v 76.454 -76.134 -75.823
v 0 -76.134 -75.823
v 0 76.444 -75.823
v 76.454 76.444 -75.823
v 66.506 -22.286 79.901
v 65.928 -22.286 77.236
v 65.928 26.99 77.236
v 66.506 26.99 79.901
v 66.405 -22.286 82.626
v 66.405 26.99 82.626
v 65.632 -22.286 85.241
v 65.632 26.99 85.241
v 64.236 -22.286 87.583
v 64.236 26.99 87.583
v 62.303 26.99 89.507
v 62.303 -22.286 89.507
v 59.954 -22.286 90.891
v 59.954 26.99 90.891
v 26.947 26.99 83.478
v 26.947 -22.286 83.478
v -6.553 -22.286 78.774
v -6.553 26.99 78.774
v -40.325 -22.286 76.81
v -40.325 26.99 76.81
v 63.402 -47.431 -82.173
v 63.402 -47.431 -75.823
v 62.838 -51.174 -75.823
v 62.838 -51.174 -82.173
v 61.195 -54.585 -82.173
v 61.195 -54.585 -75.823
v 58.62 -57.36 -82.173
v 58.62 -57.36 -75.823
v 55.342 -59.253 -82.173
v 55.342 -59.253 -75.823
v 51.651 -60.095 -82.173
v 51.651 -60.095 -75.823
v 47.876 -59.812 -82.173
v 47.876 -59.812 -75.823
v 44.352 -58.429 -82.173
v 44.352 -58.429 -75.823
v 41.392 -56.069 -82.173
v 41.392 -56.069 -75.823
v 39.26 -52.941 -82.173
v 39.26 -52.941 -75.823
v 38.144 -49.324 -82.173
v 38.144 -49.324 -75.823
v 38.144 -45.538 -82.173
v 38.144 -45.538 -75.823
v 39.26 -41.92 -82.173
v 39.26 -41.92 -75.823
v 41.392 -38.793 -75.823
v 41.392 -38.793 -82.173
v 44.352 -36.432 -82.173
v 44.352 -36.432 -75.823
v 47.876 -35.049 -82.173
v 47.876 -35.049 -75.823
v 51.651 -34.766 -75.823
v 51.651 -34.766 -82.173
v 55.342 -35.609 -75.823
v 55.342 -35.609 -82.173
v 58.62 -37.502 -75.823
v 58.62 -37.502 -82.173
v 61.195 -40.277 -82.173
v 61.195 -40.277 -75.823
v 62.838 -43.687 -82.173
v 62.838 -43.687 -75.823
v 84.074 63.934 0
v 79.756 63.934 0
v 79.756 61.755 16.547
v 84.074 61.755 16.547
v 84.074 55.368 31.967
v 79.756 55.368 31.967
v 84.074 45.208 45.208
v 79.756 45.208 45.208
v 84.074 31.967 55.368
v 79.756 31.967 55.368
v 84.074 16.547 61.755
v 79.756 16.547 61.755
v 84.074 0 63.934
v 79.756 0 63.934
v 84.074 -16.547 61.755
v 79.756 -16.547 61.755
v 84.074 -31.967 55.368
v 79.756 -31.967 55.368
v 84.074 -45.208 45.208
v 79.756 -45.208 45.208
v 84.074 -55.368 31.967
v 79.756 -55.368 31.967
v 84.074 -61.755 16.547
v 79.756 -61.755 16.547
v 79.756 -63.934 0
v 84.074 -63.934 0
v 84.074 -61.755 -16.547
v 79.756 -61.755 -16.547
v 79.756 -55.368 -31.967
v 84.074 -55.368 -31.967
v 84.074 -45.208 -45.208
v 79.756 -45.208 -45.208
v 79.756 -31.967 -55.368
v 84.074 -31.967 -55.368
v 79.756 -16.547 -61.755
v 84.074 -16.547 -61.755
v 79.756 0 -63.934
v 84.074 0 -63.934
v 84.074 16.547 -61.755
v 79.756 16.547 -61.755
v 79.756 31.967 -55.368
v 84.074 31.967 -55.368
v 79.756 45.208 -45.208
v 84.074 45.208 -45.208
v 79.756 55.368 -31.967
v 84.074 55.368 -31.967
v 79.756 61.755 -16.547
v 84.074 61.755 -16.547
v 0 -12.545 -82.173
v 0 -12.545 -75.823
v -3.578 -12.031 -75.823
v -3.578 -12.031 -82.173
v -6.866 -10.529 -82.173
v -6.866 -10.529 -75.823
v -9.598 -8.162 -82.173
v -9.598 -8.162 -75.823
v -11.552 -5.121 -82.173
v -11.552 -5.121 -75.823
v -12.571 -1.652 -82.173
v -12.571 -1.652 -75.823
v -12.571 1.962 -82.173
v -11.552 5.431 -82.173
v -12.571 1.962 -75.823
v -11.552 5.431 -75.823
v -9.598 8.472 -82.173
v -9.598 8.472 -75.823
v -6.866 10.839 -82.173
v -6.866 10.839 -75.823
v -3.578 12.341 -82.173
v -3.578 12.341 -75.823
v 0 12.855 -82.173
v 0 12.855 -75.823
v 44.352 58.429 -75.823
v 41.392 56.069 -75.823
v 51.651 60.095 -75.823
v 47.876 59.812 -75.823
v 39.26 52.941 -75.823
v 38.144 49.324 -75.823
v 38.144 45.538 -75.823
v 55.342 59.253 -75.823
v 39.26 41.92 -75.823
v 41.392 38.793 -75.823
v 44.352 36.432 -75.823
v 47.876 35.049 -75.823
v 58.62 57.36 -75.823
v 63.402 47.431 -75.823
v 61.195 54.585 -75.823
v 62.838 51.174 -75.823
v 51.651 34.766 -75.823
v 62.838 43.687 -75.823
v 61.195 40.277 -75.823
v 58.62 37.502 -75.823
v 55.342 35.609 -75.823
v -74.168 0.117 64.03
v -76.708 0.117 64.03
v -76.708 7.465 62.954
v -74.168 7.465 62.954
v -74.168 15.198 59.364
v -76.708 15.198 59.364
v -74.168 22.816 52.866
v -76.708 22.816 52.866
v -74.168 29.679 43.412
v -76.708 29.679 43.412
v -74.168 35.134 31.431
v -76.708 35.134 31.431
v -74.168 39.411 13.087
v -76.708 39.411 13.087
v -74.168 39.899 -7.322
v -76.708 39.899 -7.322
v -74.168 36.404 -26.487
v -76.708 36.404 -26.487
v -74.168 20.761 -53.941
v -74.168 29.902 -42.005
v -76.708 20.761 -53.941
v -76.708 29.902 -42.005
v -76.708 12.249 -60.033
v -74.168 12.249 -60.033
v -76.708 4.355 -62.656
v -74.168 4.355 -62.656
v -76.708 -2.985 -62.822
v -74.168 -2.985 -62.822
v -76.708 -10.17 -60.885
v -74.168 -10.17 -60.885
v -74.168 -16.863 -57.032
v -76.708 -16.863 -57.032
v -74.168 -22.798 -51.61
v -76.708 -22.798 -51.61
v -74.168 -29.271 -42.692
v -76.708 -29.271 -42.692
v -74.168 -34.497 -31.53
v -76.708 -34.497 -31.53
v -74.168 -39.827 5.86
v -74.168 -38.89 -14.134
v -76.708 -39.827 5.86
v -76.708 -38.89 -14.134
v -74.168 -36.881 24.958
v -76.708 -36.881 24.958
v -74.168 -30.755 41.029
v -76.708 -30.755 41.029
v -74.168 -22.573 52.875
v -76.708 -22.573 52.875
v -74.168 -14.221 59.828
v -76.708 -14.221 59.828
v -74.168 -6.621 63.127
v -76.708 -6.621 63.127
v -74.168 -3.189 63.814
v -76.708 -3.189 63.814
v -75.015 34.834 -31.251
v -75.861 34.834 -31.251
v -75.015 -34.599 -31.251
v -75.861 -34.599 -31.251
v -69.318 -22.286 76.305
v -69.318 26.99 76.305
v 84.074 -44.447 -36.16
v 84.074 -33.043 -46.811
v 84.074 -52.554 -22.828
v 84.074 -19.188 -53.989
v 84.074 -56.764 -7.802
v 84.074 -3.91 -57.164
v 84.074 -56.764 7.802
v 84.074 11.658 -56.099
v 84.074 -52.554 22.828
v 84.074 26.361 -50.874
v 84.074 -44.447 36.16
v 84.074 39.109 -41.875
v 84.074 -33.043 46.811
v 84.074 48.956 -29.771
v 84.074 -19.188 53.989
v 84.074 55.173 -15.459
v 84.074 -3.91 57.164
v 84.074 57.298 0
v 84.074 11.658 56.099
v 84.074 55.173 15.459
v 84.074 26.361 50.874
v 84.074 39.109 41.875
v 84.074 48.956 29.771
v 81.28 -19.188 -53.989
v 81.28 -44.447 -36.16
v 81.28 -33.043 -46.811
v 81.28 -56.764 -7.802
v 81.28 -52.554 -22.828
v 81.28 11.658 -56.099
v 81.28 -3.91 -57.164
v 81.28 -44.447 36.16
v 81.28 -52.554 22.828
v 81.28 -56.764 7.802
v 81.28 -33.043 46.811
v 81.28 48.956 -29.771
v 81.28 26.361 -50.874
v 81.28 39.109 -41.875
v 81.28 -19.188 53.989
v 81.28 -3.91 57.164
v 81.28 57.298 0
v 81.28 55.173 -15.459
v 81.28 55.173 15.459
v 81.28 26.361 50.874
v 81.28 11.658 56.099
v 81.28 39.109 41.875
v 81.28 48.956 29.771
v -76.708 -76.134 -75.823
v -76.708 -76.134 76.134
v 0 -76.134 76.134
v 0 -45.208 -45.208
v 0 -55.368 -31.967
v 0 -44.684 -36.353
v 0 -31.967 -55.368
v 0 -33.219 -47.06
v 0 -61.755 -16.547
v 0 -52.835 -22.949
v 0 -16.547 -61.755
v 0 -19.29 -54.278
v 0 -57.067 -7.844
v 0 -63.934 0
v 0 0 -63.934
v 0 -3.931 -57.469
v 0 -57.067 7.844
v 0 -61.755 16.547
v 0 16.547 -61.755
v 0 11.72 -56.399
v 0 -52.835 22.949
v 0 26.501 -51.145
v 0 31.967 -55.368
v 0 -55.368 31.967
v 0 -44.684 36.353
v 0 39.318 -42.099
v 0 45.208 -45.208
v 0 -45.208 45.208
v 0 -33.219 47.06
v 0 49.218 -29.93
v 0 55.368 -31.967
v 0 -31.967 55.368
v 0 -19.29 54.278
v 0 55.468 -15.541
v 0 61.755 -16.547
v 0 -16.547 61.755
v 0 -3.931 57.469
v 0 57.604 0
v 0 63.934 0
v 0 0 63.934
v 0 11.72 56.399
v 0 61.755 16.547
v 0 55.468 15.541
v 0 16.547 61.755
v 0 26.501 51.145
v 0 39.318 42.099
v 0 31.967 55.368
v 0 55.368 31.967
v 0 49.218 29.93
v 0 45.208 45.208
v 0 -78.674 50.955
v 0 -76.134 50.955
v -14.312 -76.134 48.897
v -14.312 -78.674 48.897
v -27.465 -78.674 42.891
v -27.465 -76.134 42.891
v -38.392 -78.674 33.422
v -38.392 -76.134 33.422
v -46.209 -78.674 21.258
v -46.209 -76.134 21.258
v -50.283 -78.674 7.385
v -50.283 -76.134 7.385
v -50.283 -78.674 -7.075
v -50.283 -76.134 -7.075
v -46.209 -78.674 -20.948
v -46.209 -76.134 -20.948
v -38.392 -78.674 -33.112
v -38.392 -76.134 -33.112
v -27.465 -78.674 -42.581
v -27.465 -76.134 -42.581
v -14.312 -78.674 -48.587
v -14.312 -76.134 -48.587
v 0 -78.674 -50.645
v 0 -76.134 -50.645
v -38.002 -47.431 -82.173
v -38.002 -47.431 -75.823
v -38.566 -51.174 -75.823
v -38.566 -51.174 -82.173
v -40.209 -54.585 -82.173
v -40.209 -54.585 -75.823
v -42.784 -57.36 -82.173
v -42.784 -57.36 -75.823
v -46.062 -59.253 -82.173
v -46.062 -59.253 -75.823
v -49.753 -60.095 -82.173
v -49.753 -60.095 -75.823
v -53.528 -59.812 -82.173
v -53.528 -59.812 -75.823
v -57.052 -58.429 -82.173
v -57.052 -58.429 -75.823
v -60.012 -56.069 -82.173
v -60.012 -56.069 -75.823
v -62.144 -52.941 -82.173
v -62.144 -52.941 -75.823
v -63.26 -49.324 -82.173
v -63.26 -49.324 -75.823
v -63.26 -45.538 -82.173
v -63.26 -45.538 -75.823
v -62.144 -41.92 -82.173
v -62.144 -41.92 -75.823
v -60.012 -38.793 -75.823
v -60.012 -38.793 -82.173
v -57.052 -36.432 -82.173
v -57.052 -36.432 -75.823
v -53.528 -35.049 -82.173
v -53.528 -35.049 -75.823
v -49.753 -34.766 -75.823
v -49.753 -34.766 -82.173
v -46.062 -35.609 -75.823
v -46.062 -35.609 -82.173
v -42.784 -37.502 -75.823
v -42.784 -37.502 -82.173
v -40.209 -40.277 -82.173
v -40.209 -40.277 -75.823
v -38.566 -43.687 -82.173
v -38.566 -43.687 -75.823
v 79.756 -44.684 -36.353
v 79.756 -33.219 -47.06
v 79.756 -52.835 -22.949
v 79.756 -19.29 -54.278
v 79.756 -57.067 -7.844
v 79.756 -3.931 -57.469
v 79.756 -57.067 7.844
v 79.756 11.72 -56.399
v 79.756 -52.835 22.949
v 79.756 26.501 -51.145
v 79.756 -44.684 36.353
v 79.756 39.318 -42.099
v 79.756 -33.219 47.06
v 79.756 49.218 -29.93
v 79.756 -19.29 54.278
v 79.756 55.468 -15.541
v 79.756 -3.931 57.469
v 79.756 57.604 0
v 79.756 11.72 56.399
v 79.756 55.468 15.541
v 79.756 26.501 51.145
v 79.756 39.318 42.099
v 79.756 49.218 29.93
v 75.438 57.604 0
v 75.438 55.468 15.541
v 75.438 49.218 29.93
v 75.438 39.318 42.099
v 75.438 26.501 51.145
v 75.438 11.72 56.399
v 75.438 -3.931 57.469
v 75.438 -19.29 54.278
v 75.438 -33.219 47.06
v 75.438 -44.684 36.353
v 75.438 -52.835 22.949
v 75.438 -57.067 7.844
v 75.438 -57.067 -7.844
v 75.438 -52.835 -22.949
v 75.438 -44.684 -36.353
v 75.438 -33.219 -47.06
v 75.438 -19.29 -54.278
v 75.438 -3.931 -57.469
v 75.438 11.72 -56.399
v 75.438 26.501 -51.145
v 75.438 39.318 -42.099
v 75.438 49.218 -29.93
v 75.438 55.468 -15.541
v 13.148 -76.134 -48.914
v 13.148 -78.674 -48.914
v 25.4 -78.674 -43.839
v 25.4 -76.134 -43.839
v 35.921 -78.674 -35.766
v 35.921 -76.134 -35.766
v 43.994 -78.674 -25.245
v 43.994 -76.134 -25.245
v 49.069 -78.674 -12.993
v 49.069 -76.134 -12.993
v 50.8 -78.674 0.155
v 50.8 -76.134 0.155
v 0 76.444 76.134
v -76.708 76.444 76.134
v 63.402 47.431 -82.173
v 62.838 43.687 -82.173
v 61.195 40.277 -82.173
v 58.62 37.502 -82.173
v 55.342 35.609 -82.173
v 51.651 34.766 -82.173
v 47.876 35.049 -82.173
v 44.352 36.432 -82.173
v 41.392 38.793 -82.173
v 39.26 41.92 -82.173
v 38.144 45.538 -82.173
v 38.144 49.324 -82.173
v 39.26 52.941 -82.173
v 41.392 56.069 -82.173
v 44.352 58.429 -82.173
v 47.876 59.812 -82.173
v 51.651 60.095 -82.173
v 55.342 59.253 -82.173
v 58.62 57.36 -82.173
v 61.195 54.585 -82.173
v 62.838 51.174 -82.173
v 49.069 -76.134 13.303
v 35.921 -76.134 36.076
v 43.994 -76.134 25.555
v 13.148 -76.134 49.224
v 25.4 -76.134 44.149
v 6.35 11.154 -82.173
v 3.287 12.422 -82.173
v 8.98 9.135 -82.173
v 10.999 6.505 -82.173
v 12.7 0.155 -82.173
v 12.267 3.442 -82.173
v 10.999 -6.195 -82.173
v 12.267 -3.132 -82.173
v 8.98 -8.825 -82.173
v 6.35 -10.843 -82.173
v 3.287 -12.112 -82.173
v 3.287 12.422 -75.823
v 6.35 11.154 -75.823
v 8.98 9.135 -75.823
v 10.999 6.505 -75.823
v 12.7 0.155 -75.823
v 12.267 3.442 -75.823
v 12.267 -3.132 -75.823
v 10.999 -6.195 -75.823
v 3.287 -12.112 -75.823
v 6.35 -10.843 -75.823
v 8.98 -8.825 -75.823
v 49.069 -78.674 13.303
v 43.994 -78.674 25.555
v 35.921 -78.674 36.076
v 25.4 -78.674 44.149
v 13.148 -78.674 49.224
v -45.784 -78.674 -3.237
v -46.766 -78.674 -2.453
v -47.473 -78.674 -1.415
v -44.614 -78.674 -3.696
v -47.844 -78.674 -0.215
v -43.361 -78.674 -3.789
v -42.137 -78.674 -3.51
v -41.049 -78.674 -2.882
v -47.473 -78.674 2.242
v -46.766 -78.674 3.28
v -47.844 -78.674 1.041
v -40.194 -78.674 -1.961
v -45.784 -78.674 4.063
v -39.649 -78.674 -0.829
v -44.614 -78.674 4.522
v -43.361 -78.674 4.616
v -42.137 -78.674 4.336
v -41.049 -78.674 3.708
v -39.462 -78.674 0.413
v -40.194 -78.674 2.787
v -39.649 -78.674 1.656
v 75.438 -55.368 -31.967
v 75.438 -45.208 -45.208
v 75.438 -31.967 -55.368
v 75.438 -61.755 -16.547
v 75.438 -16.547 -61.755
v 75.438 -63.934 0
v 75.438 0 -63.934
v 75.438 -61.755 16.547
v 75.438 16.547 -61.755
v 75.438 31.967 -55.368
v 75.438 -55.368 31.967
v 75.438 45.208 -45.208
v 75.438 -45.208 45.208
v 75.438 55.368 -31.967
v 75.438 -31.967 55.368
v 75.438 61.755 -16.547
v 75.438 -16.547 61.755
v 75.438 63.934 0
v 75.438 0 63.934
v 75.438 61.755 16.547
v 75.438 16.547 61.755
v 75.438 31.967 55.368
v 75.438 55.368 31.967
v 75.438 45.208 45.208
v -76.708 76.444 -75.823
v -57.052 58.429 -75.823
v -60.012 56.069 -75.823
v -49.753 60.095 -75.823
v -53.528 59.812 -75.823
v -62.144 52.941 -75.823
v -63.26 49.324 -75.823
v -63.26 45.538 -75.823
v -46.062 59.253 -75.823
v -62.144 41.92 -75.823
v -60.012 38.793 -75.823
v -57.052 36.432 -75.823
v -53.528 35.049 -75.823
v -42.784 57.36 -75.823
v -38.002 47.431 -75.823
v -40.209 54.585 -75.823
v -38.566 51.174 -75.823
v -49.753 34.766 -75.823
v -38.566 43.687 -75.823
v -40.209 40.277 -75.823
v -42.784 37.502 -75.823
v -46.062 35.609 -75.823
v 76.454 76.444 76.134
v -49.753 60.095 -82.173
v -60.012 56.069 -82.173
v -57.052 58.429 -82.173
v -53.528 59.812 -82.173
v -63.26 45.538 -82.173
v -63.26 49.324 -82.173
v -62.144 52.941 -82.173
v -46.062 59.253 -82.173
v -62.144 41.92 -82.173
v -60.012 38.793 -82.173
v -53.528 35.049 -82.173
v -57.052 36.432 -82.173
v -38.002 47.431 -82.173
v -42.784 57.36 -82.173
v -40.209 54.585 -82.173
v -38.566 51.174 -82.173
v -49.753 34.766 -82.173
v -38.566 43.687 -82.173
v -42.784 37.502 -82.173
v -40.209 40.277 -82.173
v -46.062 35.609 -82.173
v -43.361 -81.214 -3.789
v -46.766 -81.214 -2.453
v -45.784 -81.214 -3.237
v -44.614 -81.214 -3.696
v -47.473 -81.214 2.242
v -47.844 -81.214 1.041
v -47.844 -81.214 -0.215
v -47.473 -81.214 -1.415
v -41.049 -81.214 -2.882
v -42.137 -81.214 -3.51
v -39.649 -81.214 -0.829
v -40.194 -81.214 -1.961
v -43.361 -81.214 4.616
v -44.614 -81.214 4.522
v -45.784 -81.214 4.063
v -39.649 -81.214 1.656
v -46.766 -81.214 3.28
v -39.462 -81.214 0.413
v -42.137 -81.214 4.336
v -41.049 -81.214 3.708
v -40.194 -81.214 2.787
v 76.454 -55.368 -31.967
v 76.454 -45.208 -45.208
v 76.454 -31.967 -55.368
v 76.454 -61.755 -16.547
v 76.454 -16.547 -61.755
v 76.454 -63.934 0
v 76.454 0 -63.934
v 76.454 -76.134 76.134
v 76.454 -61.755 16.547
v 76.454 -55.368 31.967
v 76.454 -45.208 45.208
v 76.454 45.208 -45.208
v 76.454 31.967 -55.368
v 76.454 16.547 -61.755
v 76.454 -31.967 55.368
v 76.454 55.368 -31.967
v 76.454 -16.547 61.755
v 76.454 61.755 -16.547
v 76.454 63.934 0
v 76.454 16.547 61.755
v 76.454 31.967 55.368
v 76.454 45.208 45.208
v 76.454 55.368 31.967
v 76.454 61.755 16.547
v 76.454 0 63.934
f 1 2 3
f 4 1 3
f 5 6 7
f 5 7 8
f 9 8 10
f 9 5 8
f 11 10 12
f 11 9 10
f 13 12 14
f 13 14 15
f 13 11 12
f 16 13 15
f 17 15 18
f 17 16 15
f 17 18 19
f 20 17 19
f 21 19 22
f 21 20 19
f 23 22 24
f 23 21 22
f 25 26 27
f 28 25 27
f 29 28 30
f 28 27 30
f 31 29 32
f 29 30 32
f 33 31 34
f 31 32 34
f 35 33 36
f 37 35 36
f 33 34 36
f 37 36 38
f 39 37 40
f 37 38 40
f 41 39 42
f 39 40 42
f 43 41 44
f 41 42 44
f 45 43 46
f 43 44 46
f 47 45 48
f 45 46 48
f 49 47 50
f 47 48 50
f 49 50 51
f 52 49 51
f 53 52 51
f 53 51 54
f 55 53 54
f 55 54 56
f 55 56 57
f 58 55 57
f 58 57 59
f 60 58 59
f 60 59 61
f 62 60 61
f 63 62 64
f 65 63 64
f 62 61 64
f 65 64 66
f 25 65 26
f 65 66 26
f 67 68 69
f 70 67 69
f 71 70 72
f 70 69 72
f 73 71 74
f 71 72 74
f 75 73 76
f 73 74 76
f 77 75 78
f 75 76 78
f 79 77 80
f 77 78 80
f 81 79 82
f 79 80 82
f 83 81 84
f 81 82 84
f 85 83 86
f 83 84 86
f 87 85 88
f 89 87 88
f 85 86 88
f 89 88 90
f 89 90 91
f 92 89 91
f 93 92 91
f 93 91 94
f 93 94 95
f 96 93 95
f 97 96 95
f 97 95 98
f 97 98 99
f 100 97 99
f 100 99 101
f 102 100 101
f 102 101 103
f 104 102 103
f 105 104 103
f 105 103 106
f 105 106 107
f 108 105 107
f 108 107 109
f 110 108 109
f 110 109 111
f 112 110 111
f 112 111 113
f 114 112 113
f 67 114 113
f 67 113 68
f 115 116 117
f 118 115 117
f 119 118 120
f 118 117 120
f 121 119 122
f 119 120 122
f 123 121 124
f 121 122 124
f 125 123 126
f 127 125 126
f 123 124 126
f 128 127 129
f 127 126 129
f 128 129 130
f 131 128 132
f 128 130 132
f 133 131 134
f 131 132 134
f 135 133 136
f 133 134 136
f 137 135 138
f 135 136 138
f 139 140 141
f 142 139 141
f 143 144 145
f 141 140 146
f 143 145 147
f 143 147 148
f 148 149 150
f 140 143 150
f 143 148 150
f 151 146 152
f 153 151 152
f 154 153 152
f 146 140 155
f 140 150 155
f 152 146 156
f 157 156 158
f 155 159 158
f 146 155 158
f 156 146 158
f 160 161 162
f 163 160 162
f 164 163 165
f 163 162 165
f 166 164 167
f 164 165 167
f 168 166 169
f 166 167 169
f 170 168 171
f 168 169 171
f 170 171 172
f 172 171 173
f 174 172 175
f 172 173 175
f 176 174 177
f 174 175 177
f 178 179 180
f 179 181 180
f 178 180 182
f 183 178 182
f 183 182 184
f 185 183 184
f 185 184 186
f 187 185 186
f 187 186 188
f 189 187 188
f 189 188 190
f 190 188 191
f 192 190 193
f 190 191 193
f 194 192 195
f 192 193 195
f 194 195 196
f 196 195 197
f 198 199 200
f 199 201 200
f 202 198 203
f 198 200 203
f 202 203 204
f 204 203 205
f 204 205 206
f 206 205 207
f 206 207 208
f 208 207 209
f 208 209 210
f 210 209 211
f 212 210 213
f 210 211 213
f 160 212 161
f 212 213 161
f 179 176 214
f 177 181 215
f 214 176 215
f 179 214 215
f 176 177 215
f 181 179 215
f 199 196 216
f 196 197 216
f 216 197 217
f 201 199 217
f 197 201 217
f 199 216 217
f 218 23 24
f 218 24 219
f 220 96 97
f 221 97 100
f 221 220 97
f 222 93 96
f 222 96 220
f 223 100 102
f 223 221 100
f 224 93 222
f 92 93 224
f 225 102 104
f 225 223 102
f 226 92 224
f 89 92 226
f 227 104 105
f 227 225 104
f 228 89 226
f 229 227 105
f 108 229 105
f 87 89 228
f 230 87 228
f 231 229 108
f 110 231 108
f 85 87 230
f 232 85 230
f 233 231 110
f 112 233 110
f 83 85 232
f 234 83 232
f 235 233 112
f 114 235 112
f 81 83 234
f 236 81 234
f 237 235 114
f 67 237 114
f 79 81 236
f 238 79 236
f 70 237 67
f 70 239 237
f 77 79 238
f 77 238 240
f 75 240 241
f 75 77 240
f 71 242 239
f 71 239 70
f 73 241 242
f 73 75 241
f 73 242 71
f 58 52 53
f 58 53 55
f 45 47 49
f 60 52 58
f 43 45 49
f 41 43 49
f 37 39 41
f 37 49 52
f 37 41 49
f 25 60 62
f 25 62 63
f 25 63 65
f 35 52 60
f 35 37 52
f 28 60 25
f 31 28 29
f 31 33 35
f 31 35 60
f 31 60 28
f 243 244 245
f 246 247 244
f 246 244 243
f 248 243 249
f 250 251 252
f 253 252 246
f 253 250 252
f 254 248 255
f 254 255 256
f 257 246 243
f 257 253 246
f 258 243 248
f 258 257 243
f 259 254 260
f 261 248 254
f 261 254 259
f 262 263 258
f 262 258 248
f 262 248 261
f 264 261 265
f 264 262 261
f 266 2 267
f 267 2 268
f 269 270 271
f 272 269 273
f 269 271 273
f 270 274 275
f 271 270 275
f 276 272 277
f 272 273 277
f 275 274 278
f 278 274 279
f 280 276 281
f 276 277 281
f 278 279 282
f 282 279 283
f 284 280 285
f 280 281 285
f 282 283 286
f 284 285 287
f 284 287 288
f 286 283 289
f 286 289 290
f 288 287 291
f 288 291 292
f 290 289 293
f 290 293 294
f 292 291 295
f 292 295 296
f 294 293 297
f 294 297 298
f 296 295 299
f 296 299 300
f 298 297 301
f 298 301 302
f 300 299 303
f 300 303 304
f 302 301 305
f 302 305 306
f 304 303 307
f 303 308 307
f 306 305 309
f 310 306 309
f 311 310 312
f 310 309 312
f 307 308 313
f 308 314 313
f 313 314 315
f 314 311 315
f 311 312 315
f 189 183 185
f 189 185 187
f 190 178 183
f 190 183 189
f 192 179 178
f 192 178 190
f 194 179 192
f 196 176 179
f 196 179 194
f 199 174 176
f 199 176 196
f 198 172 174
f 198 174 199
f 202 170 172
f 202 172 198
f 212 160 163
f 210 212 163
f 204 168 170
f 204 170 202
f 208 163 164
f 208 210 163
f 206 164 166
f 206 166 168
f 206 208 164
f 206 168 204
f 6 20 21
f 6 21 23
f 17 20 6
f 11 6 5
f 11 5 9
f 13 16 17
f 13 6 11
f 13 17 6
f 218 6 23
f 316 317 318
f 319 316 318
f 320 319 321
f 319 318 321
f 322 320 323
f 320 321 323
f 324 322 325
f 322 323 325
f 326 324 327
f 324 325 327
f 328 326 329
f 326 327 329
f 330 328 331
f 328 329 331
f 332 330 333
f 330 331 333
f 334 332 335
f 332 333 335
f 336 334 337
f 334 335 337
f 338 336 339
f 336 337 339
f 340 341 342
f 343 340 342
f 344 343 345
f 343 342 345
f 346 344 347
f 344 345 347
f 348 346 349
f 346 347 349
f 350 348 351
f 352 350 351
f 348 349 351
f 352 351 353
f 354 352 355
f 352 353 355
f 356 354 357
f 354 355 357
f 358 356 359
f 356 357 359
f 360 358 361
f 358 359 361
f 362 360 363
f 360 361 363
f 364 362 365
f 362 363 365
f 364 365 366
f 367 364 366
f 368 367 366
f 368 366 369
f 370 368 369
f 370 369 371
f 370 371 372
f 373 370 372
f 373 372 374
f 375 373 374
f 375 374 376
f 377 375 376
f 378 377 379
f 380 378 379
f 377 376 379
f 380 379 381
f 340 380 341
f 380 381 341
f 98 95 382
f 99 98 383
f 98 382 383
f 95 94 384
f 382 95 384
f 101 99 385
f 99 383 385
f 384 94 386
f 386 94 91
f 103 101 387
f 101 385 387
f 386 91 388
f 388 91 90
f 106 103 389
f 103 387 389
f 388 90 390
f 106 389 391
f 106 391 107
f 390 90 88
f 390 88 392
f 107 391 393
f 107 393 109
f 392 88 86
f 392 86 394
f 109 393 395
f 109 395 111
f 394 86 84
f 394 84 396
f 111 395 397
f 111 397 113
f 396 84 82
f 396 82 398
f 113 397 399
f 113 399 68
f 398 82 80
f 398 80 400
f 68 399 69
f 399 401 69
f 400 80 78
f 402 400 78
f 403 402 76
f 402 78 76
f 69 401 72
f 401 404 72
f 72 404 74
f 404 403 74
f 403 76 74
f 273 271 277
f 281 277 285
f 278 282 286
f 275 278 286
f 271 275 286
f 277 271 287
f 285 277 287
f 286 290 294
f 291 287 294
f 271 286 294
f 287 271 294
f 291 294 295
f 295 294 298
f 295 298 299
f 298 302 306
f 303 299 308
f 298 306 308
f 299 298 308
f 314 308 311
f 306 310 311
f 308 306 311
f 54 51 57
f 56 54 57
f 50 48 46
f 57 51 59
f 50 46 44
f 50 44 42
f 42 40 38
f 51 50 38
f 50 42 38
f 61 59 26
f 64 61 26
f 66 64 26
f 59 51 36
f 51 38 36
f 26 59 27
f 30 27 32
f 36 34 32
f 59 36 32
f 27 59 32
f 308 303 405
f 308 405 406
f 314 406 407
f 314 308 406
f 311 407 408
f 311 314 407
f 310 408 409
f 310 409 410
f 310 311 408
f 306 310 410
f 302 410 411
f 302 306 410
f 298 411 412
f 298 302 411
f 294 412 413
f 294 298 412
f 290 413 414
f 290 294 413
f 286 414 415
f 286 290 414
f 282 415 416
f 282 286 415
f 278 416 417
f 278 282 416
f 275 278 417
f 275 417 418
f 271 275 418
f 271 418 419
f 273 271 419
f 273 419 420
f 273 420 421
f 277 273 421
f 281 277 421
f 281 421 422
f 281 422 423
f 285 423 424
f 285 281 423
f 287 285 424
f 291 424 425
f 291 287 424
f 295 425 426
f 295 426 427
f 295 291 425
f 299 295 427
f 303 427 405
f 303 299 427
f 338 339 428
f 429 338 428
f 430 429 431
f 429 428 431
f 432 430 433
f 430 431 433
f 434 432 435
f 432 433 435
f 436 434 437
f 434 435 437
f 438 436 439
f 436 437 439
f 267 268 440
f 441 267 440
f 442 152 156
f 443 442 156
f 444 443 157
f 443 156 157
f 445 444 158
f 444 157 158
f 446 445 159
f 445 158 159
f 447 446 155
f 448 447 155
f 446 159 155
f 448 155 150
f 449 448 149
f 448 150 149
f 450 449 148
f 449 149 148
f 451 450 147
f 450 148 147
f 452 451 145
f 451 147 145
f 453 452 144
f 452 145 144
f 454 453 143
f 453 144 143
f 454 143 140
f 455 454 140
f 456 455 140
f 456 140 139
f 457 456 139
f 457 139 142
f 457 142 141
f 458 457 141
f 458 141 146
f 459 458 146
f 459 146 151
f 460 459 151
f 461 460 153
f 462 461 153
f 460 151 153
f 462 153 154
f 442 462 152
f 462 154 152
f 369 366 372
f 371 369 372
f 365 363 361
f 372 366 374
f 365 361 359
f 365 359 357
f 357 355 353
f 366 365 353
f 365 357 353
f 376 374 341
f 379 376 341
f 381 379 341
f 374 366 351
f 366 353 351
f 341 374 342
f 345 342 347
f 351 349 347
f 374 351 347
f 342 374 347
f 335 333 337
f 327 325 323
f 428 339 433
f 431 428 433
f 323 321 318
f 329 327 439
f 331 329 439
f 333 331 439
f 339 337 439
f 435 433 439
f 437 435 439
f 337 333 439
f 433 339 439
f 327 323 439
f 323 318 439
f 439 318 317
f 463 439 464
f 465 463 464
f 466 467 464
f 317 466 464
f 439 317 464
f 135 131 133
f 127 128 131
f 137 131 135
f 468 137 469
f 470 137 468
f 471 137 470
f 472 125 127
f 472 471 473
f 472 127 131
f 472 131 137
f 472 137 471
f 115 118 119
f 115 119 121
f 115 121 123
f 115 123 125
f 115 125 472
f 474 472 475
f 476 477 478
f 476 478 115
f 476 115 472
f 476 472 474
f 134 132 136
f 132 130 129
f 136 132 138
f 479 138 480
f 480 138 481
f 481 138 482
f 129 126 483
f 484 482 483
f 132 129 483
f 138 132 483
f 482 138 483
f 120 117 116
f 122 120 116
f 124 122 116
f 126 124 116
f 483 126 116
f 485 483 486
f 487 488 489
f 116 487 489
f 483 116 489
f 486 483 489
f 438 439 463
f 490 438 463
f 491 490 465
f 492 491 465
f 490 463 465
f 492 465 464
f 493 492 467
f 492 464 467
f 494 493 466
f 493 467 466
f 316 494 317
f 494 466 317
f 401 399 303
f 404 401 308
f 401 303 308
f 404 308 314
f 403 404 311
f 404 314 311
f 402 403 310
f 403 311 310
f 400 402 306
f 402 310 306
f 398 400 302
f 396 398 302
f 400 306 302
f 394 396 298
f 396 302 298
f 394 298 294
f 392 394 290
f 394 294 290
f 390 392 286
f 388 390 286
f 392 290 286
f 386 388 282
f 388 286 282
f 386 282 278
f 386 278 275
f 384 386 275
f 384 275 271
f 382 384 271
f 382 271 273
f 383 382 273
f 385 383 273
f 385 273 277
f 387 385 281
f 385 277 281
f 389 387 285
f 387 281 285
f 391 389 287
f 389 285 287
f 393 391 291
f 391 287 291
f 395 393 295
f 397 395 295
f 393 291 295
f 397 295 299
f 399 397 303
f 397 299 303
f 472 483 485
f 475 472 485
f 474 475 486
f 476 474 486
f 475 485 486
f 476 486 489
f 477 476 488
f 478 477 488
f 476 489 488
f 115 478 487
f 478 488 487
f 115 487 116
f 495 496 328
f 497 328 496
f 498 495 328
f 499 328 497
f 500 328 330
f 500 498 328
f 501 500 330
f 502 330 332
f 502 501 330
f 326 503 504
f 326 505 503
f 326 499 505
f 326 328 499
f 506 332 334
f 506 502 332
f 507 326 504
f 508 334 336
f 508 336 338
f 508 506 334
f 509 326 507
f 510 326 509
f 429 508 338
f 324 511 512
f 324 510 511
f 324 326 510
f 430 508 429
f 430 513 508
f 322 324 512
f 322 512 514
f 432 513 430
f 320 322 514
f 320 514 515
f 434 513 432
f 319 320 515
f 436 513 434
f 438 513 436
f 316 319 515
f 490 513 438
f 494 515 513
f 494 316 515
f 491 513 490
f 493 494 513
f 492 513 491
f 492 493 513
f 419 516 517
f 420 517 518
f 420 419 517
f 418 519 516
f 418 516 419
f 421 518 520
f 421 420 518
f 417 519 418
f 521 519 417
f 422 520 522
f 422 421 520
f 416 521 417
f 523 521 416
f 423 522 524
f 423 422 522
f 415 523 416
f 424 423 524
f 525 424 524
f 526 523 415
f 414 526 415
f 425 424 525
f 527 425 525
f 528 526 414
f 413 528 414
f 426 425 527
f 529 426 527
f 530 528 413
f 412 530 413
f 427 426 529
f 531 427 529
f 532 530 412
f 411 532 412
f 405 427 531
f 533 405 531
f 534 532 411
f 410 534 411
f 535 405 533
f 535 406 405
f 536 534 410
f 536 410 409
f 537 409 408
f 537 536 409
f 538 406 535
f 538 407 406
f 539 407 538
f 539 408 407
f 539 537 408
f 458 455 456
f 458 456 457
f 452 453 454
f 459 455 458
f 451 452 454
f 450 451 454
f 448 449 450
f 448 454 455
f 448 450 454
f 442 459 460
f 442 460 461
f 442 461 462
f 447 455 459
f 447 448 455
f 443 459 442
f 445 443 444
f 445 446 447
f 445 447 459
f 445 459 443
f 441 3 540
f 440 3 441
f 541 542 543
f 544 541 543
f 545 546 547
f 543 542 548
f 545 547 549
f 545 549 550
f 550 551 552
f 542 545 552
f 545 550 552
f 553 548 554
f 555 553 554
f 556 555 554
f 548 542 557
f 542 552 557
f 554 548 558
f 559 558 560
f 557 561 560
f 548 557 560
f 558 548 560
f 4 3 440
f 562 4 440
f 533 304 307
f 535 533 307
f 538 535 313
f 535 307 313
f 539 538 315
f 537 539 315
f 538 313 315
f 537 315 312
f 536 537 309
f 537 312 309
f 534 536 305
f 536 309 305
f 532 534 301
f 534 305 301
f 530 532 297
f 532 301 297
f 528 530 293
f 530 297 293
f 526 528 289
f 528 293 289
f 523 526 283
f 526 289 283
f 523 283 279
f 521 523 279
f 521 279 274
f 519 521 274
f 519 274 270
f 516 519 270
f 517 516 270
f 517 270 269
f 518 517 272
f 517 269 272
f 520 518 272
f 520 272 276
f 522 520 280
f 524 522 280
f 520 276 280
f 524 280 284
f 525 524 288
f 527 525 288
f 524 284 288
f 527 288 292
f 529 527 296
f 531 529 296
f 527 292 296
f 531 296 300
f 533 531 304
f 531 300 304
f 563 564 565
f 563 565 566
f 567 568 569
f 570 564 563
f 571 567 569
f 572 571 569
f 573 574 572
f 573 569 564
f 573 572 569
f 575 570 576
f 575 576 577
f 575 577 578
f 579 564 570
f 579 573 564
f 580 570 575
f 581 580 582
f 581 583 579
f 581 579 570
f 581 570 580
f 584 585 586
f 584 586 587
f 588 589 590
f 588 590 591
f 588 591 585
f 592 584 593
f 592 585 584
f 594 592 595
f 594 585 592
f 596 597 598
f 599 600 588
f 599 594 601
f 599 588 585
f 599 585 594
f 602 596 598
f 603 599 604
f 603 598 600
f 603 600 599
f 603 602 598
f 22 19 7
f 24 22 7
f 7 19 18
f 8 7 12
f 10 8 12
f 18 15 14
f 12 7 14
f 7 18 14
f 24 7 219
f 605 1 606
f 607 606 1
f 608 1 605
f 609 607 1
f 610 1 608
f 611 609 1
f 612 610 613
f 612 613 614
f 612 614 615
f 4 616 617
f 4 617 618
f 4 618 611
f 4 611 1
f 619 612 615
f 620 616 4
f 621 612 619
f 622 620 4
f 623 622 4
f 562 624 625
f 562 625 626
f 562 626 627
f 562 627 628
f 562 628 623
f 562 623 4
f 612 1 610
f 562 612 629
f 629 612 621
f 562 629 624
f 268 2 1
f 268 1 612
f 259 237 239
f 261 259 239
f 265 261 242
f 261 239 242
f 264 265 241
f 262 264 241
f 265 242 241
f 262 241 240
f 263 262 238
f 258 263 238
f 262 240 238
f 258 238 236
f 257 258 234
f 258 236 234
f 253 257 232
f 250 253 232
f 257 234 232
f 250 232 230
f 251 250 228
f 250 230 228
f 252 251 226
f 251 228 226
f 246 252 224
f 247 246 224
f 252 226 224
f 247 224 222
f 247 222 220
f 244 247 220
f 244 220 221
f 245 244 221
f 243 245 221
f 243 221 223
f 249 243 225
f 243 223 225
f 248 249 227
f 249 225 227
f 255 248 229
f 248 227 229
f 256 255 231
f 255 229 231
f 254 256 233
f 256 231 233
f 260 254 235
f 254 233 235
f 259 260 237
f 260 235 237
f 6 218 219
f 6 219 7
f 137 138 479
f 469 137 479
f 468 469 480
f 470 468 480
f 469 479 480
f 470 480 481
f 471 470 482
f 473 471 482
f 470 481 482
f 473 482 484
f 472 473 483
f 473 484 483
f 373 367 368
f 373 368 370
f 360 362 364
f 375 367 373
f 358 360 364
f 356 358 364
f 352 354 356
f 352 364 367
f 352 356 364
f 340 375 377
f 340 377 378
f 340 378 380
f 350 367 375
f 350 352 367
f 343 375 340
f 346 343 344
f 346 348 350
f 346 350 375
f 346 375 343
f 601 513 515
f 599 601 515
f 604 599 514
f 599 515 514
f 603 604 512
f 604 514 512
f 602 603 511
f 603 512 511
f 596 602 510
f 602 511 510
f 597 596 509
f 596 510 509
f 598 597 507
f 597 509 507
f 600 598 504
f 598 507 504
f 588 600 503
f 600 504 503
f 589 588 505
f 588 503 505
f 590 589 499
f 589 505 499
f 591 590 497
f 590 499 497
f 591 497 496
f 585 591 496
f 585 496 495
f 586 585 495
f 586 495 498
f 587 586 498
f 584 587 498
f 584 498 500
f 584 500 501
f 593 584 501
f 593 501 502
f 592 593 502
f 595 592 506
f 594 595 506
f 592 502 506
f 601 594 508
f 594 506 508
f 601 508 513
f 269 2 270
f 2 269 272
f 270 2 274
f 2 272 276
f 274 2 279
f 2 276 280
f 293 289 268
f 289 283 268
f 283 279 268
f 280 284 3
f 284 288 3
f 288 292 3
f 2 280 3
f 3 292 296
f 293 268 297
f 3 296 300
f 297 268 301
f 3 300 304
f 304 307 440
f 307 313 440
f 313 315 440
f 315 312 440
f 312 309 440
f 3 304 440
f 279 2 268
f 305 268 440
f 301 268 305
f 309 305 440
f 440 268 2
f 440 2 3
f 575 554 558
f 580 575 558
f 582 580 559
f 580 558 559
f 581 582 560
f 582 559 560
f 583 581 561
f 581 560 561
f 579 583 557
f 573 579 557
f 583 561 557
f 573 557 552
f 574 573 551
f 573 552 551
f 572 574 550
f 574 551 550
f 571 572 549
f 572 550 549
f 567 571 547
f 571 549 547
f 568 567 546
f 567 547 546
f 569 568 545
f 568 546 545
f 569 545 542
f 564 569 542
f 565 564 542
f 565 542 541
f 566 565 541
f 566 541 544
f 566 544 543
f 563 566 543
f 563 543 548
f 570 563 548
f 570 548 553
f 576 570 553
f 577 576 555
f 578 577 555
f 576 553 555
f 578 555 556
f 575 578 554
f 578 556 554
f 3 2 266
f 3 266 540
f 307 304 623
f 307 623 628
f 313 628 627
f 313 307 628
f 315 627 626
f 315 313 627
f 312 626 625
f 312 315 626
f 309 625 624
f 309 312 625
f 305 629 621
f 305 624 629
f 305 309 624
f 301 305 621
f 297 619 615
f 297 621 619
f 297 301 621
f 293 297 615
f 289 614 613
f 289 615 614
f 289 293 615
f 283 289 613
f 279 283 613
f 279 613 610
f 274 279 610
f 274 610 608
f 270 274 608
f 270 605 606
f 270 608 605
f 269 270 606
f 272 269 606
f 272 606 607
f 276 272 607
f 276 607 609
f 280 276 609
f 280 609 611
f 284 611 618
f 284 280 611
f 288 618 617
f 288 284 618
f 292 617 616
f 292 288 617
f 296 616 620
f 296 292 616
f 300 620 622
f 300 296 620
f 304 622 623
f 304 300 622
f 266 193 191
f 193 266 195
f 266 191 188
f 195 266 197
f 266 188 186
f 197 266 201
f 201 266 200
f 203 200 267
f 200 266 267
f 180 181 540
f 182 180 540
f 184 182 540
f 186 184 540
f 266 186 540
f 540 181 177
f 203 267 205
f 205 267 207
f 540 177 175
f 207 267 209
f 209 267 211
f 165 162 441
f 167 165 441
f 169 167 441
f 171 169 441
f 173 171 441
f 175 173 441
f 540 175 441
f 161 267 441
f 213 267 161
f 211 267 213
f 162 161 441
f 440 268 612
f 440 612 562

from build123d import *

# Parameters (mm, degrees)
F1_W      = 152.577213943
F1_H      = 151.9569754601
F2_DEPTH  = 76.454
F0_R      = 63.9339901924
F0_R_2    = 57.603630209
F0_R_3    = 8.3357283428
F0_R_4    = 5.5518623653
F0_R_5    = 3.2892816449
F3_DEPTH  = 84.074
F4_DEPTH  = 83.82
F5_DEPTH  = 79.756
F6_DEPTH  = 75.438
F7_DEPTH  = 76.708
F8_R      = 3.7795068471
F9_DEPTH  = 2.54
F10_R     = 4.214493327
F11_DEPTH = 2.54
F13_DEPTH = 103.124
F14_DEPTH = 53.848
F15_R     = 12.7
F16_DEPTH = 6.35
F18_DEPTH = 2.54
F19_R     = 57.2977991131
F20_DEPTH = 2.794


with BuildPart() as f2:
    # F1 (on Right) → F2 (new body)
    with BuildSketch(Plane.YZ):
        with Locations((0.1550577581, 0.1550614834)):
            Rectangle(F1_W, F1_H)
    extrude(amount=F2_DEPTH)

    # F0 (on Right) → F3 (join)
    with BuildSketch(Plane.YZ):
        Circle(F0_R)
        Circle(F0_R_2, mode=Mode.SUBTRACT)
        Circle(F0_R_2)
        Circle(F0_R_3, mode=Mode.SUBTRACT)
        Circle(F0_R_3)
        Circle(F0_R_4, mode=Mode.SUBTRACT)
        Circle(F0_R_4)
        Circle(F0_R_5, mode=Mode.SUBTRACT)
        Circle(F0_R_5)
    extrude(amount=F3_DEPTH)

    # F0 (on Right) → F4 (join)
    with BuildSketch(Plane.YZ):
        Circle(F0_R_4)
        Circle(F0_R_5, mode=Mode.SUBTRACT)
        Circle(F0_R_5)
    extrude(amount=F4_DEPTH)

    # F0 (on Right) → F5 (cut)
    with BuildSketch(Plane.YZ):
        Circle(F0_R)
        Circle(F0_R_2, mode=Mode.SUBTRACT)
    extrude(amount=F5_DEPTH, mode=Mode.SUBTRACT)

    # F19 (on face) → F20 (cut)
    with BuildSketch(Plane.YZ.offset(84.074)):
        Circle(F19_R)
    extrude(amount=-F20_DEPTH, mode=Mode.SUBTRACT)


with BuildPart() as f6:
    # F0 (on Right) → F6 (new body)
    with BuildSketch(Plane.YZ):
        Circle(F0_R)
        Circle(F0_R_2, mode=Mode.SUBTRACT)
    extrude(amount=F6_DEPTH)


with BuildPart() as f7:
    # F1 (on Right) → F7 (new body)
    with BuildSketch(Plane.YZ):
        with Locations((0.1550577581, 0.1550614834)):
            Rectangle(F1_W, F1_H)
    extrude(amount=-F7_DEPTH)

    # F17 (on face) → F18 (cut)
    with BuildSketch(Plane(origin=(-76.708, 0, 0), x_dir=(0, -1, 0), z_dir=(-1, 0, 0))):
        with BuildLine():
            add(Edge.make_bspline(
                [(-0.117408068, 64.0303865075), (-69.5502769999, 64.0303865075), (-34.833842534, -31.2513980898), (-0.117408068, -126.5331826871), (34.5990263979, -31.2513980898), (69.3154608638, 64.0303865075), (-0.117408068, 64.0303865075)],
                knots=[0, 0, 0, 2.0943951024, 2.0943951024, 4.1887902048, 4.1887902048, 6.2831853072, 6.2831853072, 6.2831853072], degree=2, weights=[1, 0.5, 1, 0.5, 1, 0.5, 1]))
        make_face()
    extrude(amount=-F18_DEPTH, mode=Mode.SUBTRACT)


with BuildPart() as f9:
    # F8 (on face) → F9 (new body)
    with BuildSketch(Plane.XZ.offset(76.1335492134)):
        with BuildLine():
            Line((0, -50.6449385166), (0, 50.9550614834))
            ThreePointArc((0, 50.9550614834), (-50.8, 0.1550614834), (0, -50.6449385166))
        make_face()
        with Locations((-43.2630628347, 0.1550614834)):
            Circle(F8_R, mode=Mode.SUBTRACT)
        with BuildLine():
            ThreePointArc((0, -50.6449385166), (35.9210244843, -35.7659630009), (50.8, 0.1550614834))
            ThreePointArc((50.8, 0.1550614834), (35.9210244843, 36.0760859677), (0, 50.9550614834))
            Line((0, 50.9550614834), (0, -50.6449385166))
        make_face()
        with Locations((-43.2630628347, 0.1550614834)):
            Circle(F8_R)
    extrude(amount=F9_DEPTH)

    # F10 (on face) → F11 (join)
    with BuildSketch(Plane.XZ.offset(78.6735492134)):
        with Locations((-43.676327914, 0.4132648755)):
            Circle(F10_R)
    extrude(amount=F11_DEPTH)


with BuildPart() as f13:
    # F12 (on face) → F13 (new body)
    with BuildSketch(Plane.XZ.offset(76.1335492134)):
        with BuildLine():
            Line((-69.3183791608, 76.3053011137), (65.9282356501, 77.2363245487))
            ThreePointArc((65.9282356501, 77.2363245487), (65.6323521799, 85.2412227829), (59.9541589618, 90.8913612366))
            ThreePointArc((59.9541589618, 90.8913612366), (10.2450181107, 80.7850982994), (-40.3250381351, 76.809592545))
            Line((-40.3250381351, 76.809592545), (-69.3183791608, 76.3053011137))
        make_face()
    extrude(amount=-F13_DEPTH)

    # F14 (cut): a face of the model
    f14_faces = [f13.faces().sort_by_distance(p)[0] for p in [
        (35.6560596218, -76.1335492134, 81.262708953),
    ]]
    extrude(f14_faces, amount=-F14_DEPTH, mode=Mode.SUBTRACT)


with BuildPart() as f16:
    # F15 (on face) → F16 (new body)
    with BuildSketch(Plane(origin=(0, 0, -75.8234262466), x_dir=(1, 0, 0), z_dir=(0, 0, -1))):
        with Locations((-50.7018305361, 47.4308095872)):
            Circle(F15_R)
    extrude(amount=F16_DEPTH)


with BuildPart() as f16b:
    # F15 (on face) → F16, piece 2 (new body)
    with BuildSketch(Plane(origin=(0, 0, -75.8234262466), x_dir=(1, 0, 0), z_dir=(0, 0, -1))):
        with BuildLine():
            Line((0, -12.8550577581), (0, 12.5449422419))
            ThreePointArc((0, 12.5449422419), (-12.7, -0.1550577581), (0, -12.8550577581))
        make_face()
        with BuildLine():
            ThreePointArc((0, -12.8550577581), (8.9802561211, -9.1353138792), (12.7, -0.1550577581))
            ThreePointArc((12.7, -0.1550577581), (8.9802561211, 8.825198363), (0, 12.5449422419))
            Line((0, 12.5449422419), (0, -12.8550577581))
        make_face()
    extrude(amount=F16_DEPTH)


with BuildPart() as f16c:
    # F15 (on face) → F16, piece 3 (new body)
    with BuildSketch(Plane(origin=(0, 0, -75.8234262466), x_dir=(1, 0, 0), z_dir=(0, 0, -1))):
        with Locations((50.7018305361, 47.4308095872)):
            Circle(F15_R)
    extrude(amount=F16_DEPTH)


with BuildPart() as f16d:
    # F15 (on face) → F16, piece 4 (new body)
    with BuildSketch(Plane(origin=(0, 0, -75.8234262466), x_dir=(1, 0, 0), z_dir=(0, 0, -1))):
        with Locations((50.7018305361, -47.4308095872)):
            Circle(F15_R)
    extrude(amount=F16_DEPTH)


with BuildPart() as f16e:
    # F15 (on face) → F16, piece 5 (new body)
    with BuildSketch(Plane(origin=(0, 0, -75.8234262466), x_dir=(1, 0, 0), z_dir=(0, 0, -1))):
        with Locations((-50.7018305361, -47.4308095872)):
            Circle(F15_R)
    extrude(amount=F16_DEPTH)


solid = Compound([f2.part, f6.part, f7.part, f9.part, f13.part, f16.part, f16b.part, f16c.part, f16d.part, f16e.part])
